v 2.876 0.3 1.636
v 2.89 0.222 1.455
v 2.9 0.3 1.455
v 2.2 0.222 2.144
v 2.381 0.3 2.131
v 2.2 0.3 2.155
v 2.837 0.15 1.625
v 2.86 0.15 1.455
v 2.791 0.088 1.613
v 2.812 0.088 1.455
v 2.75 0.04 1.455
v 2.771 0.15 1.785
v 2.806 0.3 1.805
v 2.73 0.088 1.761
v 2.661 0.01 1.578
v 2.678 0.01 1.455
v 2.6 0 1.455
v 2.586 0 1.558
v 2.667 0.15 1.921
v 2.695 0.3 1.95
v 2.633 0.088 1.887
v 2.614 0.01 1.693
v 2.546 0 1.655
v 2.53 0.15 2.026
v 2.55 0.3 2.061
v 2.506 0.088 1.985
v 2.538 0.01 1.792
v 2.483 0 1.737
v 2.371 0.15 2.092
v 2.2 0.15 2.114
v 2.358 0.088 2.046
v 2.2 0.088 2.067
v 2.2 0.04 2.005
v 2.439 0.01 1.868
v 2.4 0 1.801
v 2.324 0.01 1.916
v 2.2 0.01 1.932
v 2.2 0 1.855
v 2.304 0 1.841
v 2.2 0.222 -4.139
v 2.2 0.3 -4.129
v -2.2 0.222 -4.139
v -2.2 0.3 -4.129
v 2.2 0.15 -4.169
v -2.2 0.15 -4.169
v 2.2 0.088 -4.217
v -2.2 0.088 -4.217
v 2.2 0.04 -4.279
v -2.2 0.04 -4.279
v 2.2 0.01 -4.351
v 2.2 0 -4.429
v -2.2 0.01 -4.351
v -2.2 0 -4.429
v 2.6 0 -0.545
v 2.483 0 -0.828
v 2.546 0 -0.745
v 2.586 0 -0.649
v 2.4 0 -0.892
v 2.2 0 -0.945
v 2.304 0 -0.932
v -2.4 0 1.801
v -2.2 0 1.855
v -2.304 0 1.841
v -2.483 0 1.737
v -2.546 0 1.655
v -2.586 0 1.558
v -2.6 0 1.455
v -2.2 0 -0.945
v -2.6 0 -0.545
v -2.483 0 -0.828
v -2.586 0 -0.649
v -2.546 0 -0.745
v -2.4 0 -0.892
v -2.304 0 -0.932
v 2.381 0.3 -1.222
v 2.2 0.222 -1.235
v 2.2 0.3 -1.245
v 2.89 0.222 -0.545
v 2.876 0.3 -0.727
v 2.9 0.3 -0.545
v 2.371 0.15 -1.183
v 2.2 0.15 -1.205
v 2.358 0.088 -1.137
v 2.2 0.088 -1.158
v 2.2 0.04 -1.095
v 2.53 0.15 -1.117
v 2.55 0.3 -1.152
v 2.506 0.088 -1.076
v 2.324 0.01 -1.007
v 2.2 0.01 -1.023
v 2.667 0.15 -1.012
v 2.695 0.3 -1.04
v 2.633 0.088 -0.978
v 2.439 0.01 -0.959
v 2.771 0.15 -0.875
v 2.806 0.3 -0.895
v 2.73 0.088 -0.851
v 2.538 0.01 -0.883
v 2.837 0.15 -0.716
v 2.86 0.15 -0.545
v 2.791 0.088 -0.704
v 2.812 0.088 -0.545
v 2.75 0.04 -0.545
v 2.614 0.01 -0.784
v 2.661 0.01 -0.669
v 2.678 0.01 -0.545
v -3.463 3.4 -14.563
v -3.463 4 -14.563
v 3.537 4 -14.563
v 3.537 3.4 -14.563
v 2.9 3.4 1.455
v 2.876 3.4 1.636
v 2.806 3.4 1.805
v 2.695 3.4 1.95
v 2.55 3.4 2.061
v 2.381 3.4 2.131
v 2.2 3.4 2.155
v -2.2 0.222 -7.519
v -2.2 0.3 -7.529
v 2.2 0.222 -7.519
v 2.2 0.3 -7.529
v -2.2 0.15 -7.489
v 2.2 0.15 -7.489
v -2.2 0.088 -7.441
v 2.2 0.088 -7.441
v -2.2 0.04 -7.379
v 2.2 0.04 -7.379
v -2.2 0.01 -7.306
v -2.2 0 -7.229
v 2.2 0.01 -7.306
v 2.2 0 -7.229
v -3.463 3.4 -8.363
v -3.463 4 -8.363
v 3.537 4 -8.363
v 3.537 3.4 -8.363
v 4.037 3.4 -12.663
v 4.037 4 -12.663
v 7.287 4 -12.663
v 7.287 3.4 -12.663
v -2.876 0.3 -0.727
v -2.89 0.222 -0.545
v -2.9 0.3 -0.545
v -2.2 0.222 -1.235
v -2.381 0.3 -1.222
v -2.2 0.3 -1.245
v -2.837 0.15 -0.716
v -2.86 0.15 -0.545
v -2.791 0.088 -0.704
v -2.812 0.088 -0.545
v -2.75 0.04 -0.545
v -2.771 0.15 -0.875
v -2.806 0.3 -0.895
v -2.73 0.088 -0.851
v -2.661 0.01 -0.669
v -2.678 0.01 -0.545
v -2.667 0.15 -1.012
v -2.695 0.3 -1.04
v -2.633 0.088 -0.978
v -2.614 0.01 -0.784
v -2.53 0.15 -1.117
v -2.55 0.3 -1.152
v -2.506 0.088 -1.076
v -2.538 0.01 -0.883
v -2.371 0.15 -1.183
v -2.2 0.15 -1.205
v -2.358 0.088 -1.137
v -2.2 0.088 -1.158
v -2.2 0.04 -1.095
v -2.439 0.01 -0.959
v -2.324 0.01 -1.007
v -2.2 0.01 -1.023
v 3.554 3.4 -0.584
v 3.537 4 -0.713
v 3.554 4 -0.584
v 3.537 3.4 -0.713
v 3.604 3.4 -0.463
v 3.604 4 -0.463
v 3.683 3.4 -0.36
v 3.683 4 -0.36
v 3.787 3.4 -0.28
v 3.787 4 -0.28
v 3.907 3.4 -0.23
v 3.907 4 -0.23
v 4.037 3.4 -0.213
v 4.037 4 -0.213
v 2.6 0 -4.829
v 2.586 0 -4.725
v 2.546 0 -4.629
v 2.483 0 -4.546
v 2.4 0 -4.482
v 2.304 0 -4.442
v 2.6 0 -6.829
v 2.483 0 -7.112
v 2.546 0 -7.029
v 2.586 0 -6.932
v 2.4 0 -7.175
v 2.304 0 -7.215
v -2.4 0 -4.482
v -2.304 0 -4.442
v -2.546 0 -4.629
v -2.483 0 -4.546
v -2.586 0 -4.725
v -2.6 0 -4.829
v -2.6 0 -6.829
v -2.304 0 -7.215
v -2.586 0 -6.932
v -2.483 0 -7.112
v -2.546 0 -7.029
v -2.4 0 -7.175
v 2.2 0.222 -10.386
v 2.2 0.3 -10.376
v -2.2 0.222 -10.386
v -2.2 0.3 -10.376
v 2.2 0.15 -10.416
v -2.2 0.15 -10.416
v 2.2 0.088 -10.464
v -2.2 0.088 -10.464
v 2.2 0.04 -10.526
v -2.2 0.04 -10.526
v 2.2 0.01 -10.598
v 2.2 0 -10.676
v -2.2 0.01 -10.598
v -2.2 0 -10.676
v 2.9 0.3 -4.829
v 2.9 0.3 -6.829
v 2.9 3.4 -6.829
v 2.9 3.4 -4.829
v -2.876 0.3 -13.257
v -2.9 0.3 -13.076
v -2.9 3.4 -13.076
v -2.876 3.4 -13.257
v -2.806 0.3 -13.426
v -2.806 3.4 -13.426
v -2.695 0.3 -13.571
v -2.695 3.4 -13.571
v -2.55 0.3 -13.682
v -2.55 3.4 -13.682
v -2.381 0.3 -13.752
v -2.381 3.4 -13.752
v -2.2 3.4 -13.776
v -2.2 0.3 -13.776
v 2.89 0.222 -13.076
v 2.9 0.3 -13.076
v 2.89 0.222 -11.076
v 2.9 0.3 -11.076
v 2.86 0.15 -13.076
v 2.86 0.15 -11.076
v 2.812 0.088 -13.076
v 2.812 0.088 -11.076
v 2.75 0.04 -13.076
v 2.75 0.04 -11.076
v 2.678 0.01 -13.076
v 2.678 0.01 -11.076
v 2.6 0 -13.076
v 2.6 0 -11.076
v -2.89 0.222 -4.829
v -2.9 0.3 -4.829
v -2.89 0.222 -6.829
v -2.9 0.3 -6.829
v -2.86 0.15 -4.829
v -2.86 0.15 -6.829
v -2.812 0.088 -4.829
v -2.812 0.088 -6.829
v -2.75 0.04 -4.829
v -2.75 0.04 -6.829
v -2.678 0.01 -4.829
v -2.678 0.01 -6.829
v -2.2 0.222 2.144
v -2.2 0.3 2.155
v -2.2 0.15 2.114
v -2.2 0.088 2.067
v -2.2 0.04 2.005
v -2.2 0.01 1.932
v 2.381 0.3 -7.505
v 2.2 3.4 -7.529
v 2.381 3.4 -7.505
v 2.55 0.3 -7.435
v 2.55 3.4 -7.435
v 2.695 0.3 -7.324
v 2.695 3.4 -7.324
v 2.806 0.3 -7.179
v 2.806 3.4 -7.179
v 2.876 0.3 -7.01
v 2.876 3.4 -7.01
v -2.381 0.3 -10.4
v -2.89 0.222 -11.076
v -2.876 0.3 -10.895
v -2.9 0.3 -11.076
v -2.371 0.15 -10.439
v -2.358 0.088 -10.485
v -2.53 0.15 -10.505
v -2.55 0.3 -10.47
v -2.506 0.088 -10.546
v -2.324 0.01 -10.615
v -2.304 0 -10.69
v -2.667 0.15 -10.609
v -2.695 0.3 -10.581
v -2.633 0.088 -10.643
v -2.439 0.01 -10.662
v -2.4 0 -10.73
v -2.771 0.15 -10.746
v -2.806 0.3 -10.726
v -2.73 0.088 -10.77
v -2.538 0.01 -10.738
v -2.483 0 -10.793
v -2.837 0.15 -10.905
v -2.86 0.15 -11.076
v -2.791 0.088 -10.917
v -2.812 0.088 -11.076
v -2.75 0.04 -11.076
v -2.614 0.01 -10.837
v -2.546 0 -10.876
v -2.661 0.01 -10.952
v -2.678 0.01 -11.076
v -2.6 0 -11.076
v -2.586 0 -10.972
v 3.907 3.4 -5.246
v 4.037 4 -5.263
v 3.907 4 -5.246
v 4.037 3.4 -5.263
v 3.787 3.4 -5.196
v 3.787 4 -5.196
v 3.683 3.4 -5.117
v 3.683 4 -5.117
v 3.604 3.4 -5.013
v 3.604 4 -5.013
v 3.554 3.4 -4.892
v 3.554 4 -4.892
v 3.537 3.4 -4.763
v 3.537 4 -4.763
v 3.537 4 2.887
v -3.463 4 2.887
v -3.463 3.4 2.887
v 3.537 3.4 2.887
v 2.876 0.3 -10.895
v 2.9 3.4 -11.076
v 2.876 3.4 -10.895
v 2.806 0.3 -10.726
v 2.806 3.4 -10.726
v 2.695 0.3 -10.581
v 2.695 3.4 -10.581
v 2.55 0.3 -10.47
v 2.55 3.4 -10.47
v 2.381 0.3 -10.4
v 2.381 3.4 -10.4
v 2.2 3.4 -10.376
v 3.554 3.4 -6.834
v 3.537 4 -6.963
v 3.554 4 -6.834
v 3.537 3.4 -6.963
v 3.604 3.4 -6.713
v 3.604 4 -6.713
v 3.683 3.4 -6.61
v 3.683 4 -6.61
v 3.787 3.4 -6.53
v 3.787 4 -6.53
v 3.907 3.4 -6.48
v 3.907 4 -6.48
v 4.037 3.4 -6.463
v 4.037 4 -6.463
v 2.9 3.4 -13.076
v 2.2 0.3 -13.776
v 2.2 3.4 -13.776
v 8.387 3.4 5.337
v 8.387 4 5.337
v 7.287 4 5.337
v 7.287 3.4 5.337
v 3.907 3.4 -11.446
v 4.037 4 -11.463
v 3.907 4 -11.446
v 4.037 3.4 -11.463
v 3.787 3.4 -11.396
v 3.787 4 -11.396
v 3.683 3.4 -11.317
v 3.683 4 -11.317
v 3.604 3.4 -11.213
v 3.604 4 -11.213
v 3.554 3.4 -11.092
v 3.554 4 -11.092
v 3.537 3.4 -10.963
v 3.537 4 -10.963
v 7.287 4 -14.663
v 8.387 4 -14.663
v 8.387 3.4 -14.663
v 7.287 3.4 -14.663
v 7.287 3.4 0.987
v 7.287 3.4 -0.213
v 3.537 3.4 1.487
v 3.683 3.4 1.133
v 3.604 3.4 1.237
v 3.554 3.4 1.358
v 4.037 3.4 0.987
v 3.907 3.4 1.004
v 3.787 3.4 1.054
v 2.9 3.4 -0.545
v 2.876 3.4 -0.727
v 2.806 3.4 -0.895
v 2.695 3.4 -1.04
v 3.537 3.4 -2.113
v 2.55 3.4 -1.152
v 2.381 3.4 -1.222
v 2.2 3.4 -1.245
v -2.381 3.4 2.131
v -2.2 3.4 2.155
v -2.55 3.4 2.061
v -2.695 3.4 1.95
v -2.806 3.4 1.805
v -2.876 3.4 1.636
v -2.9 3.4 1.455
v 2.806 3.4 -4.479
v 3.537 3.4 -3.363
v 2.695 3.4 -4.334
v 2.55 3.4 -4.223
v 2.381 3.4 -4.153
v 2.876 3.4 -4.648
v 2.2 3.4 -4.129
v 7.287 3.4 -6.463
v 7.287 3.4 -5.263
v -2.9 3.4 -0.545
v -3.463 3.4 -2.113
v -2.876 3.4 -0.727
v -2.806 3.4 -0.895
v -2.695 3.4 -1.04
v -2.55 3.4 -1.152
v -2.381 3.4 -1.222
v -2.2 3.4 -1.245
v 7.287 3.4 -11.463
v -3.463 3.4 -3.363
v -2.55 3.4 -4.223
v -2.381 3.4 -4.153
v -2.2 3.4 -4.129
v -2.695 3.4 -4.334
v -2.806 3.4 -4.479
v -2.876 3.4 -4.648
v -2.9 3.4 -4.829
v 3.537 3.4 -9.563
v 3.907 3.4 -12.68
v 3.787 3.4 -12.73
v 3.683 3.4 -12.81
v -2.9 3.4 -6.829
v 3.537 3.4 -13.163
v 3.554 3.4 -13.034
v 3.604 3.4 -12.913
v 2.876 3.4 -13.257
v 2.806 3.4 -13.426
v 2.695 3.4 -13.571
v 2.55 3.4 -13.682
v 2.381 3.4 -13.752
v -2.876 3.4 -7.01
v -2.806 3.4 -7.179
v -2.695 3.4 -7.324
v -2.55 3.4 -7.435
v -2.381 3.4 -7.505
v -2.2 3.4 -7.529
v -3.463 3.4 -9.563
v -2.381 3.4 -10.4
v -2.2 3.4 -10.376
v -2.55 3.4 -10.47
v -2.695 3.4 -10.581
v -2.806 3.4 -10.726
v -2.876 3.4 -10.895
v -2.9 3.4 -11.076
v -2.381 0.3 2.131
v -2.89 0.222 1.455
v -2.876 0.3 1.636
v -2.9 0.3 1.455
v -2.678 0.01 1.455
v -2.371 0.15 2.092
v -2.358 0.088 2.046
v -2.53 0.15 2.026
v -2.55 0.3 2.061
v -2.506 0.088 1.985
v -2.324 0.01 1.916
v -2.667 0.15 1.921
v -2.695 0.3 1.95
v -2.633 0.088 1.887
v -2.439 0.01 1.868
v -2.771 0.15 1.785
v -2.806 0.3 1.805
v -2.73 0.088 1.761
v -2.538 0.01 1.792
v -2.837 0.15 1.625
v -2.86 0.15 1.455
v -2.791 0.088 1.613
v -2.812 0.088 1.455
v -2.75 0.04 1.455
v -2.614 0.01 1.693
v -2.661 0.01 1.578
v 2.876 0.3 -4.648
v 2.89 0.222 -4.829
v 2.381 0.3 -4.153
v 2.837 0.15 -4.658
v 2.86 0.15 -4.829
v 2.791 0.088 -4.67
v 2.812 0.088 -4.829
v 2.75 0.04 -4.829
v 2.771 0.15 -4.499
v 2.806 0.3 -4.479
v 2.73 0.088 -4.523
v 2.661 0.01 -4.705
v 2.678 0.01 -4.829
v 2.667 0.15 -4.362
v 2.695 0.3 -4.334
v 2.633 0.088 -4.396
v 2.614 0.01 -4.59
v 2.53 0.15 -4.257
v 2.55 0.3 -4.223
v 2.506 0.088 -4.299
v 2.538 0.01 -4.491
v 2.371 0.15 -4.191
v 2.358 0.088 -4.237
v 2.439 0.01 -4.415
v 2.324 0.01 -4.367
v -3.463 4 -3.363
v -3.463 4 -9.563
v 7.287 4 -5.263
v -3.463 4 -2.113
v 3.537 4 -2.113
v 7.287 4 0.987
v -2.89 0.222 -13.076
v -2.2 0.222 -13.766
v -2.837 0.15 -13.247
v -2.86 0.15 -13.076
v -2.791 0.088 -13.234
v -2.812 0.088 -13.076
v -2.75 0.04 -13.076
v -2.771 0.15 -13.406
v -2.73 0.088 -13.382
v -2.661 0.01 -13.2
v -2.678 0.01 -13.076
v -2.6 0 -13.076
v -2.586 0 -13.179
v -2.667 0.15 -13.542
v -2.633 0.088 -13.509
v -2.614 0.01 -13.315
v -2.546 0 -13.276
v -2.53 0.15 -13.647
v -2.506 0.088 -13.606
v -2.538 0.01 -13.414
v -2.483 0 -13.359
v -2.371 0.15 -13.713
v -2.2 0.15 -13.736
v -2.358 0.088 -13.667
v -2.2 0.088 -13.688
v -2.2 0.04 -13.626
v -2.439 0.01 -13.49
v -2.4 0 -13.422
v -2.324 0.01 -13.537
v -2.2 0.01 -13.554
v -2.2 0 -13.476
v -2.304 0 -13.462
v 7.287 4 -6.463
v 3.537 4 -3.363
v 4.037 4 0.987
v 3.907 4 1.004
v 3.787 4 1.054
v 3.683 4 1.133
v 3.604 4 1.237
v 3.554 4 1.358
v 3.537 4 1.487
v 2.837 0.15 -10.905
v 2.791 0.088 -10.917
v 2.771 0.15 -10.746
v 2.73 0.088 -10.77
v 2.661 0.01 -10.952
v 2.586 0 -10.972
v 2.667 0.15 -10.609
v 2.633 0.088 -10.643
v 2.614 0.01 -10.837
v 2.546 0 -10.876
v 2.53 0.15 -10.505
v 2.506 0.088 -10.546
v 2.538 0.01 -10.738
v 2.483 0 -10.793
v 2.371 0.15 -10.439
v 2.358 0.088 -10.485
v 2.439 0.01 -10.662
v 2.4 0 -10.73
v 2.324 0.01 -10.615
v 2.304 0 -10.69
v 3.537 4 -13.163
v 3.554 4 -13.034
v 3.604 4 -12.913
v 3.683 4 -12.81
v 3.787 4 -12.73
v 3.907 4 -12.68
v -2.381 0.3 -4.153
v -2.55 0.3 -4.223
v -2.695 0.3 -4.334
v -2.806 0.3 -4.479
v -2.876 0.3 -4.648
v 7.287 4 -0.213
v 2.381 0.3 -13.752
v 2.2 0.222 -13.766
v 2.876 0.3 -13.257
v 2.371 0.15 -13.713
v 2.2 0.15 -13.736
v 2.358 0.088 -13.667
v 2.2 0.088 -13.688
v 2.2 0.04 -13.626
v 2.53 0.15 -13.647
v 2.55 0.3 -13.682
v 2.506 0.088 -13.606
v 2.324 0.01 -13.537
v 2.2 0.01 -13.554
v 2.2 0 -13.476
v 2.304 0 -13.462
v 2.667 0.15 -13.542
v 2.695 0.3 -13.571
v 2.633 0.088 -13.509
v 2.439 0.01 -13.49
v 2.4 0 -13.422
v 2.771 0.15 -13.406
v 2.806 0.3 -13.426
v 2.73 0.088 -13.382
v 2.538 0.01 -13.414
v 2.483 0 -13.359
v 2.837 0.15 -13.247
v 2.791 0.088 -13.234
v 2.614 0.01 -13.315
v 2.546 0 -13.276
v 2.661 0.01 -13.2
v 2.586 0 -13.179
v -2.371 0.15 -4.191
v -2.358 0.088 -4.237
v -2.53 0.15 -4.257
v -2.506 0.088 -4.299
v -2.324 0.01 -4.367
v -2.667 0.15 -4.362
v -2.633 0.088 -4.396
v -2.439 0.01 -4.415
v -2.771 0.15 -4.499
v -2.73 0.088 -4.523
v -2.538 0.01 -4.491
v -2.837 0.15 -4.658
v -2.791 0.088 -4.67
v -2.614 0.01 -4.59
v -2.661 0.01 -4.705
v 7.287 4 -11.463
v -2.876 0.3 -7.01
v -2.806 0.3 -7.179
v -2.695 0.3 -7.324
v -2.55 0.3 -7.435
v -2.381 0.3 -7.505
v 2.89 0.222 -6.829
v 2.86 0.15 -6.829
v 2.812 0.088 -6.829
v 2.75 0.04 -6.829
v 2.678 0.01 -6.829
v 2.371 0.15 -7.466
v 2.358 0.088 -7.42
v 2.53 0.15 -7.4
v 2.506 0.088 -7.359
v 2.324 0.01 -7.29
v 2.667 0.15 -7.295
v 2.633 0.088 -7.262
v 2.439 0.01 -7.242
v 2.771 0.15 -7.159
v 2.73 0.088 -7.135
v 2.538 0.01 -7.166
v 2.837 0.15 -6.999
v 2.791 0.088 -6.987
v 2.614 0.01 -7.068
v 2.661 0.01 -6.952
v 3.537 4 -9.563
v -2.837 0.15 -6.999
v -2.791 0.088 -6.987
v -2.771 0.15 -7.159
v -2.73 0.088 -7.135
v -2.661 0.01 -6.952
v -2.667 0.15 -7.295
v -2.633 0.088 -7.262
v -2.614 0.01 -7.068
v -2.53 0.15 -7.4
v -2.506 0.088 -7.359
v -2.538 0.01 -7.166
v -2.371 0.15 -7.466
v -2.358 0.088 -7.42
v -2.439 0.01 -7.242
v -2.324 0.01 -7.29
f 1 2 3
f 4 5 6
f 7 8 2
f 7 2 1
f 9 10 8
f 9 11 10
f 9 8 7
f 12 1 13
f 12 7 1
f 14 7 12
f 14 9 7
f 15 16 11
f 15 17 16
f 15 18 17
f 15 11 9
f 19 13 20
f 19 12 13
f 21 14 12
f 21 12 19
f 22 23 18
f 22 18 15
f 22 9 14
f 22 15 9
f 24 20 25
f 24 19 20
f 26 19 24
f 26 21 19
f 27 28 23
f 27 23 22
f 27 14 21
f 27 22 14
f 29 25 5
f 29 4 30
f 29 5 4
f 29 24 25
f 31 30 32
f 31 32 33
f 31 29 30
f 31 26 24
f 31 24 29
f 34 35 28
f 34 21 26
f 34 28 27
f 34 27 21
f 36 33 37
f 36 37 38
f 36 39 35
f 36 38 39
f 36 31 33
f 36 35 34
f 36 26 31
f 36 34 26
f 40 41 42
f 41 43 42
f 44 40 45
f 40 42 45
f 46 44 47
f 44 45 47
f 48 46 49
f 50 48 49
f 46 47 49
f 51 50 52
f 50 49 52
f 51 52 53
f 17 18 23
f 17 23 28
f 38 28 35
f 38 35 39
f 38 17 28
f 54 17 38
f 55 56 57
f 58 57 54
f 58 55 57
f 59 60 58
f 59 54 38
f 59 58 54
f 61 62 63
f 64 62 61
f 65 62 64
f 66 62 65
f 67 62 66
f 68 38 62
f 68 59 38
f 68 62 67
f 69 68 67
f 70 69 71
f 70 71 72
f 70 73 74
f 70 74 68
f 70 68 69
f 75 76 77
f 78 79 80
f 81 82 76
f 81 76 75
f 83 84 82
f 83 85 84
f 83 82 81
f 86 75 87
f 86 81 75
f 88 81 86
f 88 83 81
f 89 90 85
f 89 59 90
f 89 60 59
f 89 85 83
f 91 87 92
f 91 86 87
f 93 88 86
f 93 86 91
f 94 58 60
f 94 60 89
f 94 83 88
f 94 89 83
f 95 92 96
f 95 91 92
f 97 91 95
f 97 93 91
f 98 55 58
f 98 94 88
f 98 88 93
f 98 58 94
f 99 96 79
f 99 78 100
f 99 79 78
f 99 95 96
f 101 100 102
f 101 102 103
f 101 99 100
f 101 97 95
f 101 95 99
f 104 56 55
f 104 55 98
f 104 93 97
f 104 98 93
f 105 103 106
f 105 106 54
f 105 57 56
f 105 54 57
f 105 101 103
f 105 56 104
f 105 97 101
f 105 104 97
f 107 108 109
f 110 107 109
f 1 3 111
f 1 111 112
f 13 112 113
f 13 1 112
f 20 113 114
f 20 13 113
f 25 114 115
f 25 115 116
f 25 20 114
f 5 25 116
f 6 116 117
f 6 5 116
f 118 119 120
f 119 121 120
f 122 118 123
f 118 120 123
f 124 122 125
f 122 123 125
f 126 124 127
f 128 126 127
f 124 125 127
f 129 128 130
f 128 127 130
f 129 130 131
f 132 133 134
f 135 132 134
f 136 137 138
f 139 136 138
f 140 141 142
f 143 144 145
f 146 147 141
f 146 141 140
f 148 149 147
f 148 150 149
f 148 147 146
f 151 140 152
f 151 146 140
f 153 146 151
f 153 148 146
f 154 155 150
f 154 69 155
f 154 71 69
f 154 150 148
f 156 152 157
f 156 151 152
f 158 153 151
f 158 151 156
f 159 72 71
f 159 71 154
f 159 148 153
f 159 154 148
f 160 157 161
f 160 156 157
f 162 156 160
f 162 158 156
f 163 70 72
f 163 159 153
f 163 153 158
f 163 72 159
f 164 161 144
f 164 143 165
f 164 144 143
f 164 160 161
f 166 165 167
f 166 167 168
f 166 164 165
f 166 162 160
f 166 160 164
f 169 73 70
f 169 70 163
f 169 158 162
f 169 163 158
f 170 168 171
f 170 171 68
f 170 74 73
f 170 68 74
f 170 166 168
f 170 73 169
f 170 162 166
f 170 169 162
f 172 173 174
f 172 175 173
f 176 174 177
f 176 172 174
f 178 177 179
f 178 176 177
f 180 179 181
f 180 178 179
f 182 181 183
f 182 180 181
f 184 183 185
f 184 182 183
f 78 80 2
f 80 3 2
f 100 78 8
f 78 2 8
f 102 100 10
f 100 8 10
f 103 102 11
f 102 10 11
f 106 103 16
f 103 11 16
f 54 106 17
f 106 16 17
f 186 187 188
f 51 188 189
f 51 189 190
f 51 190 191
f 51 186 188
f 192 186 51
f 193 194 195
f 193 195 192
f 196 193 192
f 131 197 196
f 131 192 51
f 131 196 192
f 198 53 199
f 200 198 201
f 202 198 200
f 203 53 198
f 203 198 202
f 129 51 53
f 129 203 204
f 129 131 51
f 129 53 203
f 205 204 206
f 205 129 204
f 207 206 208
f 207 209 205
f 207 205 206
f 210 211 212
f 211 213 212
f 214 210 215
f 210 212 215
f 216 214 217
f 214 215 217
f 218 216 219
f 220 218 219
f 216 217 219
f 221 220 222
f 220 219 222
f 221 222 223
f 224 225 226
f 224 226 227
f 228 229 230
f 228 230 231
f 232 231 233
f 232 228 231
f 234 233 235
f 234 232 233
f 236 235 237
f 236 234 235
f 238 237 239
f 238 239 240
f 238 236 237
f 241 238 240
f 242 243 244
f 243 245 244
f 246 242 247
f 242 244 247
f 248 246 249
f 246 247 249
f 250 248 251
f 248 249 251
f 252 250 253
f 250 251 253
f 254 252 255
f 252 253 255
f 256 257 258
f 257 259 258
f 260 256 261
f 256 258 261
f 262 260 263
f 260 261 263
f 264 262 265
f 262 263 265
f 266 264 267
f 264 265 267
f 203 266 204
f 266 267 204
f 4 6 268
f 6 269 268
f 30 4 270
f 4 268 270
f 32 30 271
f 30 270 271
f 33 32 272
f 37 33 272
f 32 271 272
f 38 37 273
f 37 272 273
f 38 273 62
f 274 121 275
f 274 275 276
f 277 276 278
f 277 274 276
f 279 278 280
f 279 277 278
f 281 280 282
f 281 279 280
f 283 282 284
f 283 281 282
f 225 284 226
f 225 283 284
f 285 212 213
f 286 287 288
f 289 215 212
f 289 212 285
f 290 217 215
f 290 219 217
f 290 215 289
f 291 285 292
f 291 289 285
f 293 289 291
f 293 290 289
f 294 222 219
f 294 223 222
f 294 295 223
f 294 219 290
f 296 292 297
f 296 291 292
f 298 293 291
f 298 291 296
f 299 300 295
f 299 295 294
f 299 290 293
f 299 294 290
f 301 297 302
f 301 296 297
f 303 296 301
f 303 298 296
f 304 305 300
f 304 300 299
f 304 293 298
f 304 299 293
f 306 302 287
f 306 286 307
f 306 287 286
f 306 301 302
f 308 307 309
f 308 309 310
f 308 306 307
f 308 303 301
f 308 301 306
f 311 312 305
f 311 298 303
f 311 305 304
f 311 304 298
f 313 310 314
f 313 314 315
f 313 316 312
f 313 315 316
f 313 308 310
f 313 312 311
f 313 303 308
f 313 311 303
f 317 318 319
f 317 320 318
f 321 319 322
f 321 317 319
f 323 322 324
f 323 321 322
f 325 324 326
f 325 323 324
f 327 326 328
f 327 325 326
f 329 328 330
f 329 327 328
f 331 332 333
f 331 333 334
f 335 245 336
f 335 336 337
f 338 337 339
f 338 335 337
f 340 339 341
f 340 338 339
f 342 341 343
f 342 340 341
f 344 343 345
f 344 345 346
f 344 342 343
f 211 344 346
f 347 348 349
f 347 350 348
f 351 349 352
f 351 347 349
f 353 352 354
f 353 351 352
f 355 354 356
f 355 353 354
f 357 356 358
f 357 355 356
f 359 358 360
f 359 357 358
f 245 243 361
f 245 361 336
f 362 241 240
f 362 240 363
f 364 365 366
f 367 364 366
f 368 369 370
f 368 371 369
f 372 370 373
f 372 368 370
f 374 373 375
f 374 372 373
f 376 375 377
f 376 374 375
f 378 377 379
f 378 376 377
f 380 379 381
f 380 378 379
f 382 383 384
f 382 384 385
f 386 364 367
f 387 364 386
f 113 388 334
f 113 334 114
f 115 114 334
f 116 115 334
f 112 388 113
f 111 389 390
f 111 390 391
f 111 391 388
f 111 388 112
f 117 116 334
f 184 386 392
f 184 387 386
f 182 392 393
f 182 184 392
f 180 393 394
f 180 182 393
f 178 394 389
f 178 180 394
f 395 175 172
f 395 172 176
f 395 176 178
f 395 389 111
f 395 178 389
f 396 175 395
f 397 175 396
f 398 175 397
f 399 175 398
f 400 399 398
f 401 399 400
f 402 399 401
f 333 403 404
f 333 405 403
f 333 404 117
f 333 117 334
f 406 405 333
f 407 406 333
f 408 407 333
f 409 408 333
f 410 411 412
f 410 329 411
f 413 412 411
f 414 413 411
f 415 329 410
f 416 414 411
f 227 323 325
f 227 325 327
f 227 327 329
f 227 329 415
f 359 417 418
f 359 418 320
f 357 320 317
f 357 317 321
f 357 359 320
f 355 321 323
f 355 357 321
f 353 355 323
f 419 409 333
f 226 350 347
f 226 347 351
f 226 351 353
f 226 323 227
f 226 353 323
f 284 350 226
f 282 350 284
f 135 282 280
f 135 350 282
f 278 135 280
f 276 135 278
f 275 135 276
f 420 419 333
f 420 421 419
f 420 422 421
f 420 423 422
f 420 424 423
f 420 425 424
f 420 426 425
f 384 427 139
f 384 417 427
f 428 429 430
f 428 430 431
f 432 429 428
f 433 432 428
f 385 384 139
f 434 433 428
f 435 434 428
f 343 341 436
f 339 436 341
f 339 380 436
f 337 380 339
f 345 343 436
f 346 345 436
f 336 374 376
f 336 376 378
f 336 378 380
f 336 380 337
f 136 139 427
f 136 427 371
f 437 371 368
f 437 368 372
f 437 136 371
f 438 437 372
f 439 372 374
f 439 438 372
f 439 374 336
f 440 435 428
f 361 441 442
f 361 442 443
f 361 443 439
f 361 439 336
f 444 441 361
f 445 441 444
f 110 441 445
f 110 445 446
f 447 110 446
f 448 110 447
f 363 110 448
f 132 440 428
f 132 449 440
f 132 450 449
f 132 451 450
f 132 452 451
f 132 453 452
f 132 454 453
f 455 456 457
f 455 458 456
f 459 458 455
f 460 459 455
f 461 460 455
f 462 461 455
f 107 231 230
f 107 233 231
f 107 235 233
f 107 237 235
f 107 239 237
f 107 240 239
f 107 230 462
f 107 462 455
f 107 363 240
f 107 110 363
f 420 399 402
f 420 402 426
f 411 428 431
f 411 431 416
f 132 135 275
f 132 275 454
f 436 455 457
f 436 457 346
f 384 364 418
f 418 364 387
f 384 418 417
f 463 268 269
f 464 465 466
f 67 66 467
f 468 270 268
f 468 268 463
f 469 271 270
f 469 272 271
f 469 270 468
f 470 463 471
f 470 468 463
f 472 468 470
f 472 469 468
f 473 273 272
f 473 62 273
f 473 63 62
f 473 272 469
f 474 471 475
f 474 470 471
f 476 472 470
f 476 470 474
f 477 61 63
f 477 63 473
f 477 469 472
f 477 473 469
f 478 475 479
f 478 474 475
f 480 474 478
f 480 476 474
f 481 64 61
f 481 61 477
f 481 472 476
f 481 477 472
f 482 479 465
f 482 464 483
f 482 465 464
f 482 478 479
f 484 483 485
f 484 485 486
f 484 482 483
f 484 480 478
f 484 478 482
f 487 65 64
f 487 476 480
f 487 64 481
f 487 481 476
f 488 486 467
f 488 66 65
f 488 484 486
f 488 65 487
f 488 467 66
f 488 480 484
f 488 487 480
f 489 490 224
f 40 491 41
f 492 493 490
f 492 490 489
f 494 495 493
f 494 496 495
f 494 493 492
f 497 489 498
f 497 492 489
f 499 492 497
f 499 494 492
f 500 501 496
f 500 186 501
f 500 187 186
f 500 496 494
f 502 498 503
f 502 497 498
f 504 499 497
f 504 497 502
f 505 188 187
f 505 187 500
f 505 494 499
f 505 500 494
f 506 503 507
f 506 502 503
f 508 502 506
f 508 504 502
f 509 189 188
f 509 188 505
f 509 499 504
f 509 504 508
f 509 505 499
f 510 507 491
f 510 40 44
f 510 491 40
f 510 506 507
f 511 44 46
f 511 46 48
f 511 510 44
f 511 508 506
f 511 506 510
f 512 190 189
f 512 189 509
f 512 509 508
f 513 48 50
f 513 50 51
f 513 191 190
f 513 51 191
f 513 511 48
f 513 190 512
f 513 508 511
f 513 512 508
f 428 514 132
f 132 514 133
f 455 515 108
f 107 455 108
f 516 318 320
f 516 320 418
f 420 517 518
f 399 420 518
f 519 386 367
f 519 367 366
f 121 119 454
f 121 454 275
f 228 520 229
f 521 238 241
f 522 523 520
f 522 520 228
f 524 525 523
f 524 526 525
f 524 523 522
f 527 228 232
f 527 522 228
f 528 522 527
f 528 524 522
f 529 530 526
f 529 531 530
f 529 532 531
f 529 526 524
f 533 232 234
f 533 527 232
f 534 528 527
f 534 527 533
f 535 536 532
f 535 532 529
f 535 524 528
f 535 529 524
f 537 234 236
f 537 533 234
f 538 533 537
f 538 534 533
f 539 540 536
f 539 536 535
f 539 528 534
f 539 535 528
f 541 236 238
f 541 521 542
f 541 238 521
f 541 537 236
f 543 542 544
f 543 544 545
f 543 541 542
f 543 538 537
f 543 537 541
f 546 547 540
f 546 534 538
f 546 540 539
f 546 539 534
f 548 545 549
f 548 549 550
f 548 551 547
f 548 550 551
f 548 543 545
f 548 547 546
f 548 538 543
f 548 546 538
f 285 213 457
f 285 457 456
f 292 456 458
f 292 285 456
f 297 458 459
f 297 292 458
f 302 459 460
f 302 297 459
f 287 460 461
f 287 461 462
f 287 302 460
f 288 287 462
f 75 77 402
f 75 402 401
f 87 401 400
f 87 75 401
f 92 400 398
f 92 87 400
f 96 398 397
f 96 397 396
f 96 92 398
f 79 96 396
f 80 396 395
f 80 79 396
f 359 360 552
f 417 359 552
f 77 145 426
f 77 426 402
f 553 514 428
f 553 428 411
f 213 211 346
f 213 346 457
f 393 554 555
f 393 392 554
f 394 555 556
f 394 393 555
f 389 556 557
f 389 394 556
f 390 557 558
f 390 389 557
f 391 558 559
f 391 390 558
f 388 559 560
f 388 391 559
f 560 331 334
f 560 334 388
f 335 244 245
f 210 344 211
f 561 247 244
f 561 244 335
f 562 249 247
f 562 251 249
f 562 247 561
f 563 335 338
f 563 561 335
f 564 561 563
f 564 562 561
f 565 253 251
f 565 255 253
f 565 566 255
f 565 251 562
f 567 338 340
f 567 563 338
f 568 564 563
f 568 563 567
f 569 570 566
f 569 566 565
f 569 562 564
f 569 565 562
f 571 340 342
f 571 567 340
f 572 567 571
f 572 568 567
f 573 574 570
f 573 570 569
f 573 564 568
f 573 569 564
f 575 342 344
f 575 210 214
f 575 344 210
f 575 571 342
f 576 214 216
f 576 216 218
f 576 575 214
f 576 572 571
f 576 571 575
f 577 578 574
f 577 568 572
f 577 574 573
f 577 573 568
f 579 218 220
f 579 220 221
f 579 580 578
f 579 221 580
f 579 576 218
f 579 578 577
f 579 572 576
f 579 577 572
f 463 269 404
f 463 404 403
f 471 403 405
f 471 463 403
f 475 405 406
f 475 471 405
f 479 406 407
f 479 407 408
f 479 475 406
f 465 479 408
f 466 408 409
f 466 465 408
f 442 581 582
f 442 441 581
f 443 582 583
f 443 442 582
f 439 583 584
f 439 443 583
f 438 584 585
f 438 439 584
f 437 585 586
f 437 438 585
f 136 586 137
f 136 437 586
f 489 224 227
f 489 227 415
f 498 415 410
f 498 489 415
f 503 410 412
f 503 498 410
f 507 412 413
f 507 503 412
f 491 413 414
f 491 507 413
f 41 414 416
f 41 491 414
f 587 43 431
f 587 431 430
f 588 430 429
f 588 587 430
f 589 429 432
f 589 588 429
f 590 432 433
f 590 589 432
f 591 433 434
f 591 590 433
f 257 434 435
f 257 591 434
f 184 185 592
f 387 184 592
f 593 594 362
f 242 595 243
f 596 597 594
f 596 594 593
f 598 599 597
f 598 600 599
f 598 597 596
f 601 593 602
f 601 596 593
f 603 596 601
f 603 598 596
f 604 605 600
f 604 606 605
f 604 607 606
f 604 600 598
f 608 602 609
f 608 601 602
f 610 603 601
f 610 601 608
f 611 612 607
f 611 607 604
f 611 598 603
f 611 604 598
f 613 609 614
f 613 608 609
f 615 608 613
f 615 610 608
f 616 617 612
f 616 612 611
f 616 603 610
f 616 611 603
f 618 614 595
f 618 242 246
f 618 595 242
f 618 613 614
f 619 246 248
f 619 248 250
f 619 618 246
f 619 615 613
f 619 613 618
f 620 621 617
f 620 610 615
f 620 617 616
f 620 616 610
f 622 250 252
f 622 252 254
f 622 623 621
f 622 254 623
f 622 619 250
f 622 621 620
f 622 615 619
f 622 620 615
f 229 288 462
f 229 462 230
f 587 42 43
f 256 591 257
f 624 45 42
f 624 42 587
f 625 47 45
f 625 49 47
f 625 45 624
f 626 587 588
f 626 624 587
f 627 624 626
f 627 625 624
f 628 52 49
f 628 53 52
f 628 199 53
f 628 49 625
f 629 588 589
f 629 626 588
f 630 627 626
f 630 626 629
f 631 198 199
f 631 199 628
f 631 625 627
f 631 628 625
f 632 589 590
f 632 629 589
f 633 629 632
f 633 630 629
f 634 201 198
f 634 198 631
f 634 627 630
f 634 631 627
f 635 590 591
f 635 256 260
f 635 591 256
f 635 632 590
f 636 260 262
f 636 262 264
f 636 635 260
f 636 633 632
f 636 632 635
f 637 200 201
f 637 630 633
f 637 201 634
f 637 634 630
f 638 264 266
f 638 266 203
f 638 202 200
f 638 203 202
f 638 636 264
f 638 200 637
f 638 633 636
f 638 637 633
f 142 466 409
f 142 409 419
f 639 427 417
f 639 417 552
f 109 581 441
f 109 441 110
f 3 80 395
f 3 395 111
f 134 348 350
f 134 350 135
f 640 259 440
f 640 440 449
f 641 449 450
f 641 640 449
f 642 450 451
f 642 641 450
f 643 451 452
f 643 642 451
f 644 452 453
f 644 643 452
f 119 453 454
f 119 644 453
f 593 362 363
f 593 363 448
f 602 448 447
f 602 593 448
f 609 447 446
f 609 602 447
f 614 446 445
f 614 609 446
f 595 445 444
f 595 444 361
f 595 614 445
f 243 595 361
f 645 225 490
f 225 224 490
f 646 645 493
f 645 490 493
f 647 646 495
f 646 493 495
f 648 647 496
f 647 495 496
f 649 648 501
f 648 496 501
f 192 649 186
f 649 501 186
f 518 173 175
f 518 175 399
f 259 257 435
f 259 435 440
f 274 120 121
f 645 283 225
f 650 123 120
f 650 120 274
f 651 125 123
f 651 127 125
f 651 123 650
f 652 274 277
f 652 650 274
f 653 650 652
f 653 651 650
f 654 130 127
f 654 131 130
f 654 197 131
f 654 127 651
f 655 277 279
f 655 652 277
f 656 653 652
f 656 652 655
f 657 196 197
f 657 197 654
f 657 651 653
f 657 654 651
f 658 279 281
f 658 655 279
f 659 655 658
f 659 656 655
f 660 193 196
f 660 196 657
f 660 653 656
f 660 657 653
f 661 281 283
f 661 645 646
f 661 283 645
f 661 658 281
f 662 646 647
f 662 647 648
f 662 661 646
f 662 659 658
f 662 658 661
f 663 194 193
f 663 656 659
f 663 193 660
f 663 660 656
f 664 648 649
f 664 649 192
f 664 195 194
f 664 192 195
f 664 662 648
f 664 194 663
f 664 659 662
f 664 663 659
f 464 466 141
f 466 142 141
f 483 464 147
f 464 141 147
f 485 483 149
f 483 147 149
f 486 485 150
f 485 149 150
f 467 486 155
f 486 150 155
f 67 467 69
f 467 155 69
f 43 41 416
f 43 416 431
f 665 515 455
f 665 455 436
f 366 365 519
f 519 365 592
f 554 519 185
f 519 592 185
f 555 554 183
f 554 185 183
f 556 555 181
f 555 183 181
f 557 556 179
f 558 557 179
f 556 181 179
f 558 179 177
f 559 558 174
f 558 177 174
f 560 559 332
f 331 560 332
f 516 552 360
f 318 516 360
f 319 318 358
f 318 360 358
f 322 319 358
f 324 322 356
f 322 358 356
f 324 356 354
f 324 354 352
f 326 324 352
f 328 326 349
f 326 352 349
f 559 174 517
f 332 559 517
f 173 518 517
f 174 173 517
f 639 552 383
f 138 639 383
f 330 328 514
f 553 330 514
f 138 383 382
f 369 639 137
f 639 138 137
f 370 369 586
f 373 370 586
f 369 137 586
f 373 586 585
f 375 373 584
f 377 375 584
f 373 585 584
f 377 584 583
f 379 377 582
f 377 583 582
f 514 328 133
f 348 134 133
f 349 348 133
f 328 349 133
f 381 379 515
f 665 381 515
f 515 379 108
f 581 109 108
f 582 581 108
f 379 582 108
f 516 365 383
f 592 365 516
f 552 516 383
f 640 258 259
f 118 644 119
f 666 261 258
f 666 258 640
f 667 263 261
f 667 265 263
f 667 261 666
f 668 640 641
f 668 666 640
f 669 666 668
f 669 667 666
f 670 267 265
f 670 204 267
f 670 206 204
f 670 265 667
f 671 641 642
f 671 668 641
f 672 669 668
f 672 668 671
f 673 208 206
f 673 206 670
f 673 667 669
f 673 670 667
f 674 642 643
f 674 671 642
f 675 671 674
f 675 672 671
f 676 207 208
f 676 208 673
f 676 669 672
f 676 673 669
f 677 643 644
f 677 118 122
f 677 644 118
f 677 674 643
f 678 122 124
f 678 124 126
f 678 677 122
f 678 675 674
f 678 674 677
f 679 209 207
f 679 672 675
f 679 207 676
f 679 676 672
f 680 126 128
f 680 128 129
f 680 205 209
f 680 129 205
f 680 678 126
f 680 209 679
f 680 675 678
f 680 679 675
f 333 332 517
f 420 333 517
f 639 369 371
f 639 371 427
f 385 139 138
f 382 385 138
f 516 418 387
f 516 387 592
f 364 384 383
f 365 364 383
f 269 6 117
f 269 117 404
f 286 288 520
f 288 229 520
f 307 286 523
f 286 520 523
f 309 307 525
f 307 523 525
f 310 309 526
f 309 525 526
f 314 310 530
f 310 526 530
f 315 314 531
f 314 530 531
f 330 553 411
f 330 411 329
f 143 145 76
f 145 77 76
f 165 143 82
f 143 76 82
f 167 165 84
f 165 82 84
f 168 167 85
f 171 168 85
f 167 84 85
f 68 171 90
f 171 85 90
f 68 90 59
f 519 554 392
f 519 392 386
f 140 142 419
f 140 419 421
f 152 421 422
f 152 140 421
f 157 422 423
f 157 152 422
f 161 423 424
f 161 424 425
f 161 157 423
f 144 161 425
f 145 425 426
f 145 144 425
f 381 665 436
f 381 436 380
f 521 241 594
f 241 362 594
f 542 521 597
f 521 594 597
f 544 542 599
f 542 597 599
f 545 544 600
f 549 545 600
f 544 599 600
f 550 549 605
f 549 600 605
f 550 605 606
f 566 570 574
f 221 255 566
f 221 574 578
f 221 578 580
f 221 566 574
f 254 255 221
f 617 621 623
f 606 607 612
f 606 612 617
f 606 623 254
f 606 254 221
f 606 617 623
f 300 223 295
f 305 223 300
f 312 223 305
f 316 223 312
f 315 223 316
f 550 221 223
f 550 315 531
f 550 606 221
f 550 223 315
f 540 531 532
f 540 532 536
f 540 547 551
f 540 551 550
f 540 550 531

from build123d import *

# Parameters (mm, degrees)
EXTRUDE_1_DEPTH      = 4
EXTRUDE_1_2_DEPTH    = 4
EXTRUDE_1_3_DEPTH    = 4
SKETCH_2_W           = 7
SKETCH_2_H           = 5
EXTRUDE_2_DEPTH      = 0.6
SKETCH_3_W           = 4.85
SKETCH_3_H           = 1.2
EXTRUDE_3_DEPTH      = 0.6
SKETCH_4_W           = 1
SKETCH_4_H           = 13.65
EXTRUDE_4_DEPTH      = 0.6
FILLET_1_R           = 0.5
FILLET_2_R           = 0.3
SKETCH_5_W           = 1.1
SKETCH_5_H           = 0.6
EXTRUDE_5_DEPTH      = 2
EXTRUDE_5_DEPTH_BACK = 18


with BuildPart() as part:
    # 草图1 → 凸台-拉伸1 (new body)
    with BuildSketch(Plane(origin=(0, 0, 0), x_dir=(1, 0, 0), z_dir=(0, 1, 0))):
        with BuildLine():
            Line((-2.2, 1.245389122), (2.2, 1.245389122))
            ThreePointArc((2.2, 1.245389122), (2.694974747, 1.040363869), (2.9, 0.545389122))
            Line((2.9, 0.545389122), (2.9, -1.454610878))
            ThreePointArc((2.9, -1.454610878), (2.694974747, -1.949585625), (2.2, -2.154610878))
            Line((2.2, -2.154610878), (-2.2, -2.154610878))
            ThreePointArc((-2.2, -2.154610878), (-2.694974747, -1.949585625), (-2.9, -1.454610878))
            Line((-2.9, -1.454610878), (-2.9, 0.545389122))
            ThreePointArc((-2.9, 0.545389122), (-2.694974747, 1.040363869), (-2.2, 1.245389122))
        make_face()
    extrude(amount=EXTRUDE_1_DEPTH)



with BuildPart() as body_2:
    # 草图1 → Extrude 1 2 (new body)
    with BuildSketch(Plane(origin=(0, 0, 0), x_dir=(1, 0, 0), z_dir=(0, 1, 0))):
        with BuildLine():
            Line((-2.2, 7.528722779), (2.2, 7.528722779))
            ThreePointArc((2.2, 7.528722779), (2.694974747, 7.323697526), (2.9, 6.828722779))
            Line((2.9, 6.828722779), (2.9, 4.828722779))
            ThreePointArc((2.9, 4.828722779), (2.694974747, 4.333748032), (2.2, 4.128722779))
            Line((2.2, 4.128722779), (-2.2, 4.128722779))
            ThreePointArc((-2.2, 4.128722779), (-2.694974747, 4.333748032), (-2.9, 4.828722779))
            Line((-2.9, 4.828722779), (-2.9, 6.828722779))
            ThreePointArc((-2.9, 6.828722779), (-2.694974747, 7.323697526), (-2.2, 7.528722779))
        make_face()
    extrude(amount=EXTRUDE_1_2_DEPTH)


with BuildPart() as body_3:
    # 草图1 → Extrude 1 3 (new body)
    with BuildSketch(Plane(origin=(0, 0, 0), x_dir=(1, 0, 0), z_dir=(0, 1, 0))):
        with BuildLine():
            Line((-2.2, 13.775919566), (2.2, 13.775919566))
            ThreePointArc((2.2, 13.775919566), (2.694974747, 13.570894313), (2.9, 13.075919566))
            Line((2.9, 13.075919566), (2.9, 11.075919566))
            ThreePointArc((2.9, 11.075919566), (2.694974747, 10.580944819), (2.2, 10.375919566))
            Line((2.2, 10.375919566), (-2.2, 10.375919566))
            ThreePointArc((-2.2, 10.375919566), (-2.694974747, 10.580944819), (-2.9, 11.075919566))
            Line((-2.9, 11.075919566), (-2.9, 13.075919566))
            ThreePointArc((-2.9, 13.075919566), (-2.694974747, 13.570894313), (-2.2, 13.775919566))
        make_face()
    extrude(amount=EXTRUDE_1_3_DEPTH)


with BuildPart() as part_1:
    add(part.part)

    add(body_2.part)  # 凸台-拉伸2 merges body 2

    add(body_3.part)  # 凸台-拉伸2 merges body 3
    # 草图2 → 凸台-拉伸2 (add)
    with BuildSketch(Plane(origin=(0, 4, 0), x_dir=(1, 0, 0), z_dir=(0, 1, 0))):
        with Locations((0.036699987, 12.063062551)):
            Rectangle(SKETCH_2_W, SKETCH_2_H)
        with Locations((0.036699987, 5.863062551)):
            Rectangle(SKETCH_2_W, SKETCH_2_H)
        with Locations((0.036699987, -0.386937449)):
            Rectangle(SKETCH_2_W, SKETCH_2_H)
    extrude(amount=-EXTRUDE_2_DEPTH)

    # 草图3 → 凸台-拉伸3 (add)
    with BuildSketch(Plane(origin=(0, 4, 0), x_dir=(1, 0, 0), z_dir=(0, 1, 0))):
        with Locations((5.961699987, 12.063062551)):
            Rectangle(SKETCH_3_W, SKETCH_3_H)
        with Locations((5.961699987, 5.863062551)):
            Rectangle(SKETCH_3_W, SKETCH_3_H)
        with Locations((5.961699987, -0.386937449)):
            Rectangle(SKETCH_3_W, SKETCH_3_H)
    extrude(amount=-EXTRUDE_3_DEPTH)

    # 草图4 → 凸台-拉伸4 (add)
    with BuildSketch(Plane.XZ.offset(-3.4)):
        with Locations((7.886699987, -5.838062551)):
            Rectangle(SKETCH_4_W, SKETCH_4_H)
    extrude(amount=-EXTRUDE_4_DEPTH)

    # 圆角1
    fillet_1_edges = [part_1.edges().sort_by_distance(p)[0] for p in [
        (3.536699987, 3.7, -11.463062551),
        (3.536699987, 3.7, -12.663062551),
        (3.536699987, 3.7, 0.986937449),
        (3.536699987, 3.7, -0.213062551),
        (3.536699987, 3.7, -5.263062551),
        (3.536699987, 3.7, -6.463062551),
    ]]
    fillet(fillet_1_edges, radius=FILLET_1_R)

    # 圆角2
    fillet_2_edges = [part_1.edges().sort_by_distance(p)[0] for p in [
        (-2.9, 0, 0.454610878),
        (-2.694974747, 0, -1.040363869),
        (-2.694974747, 0, -13.570894313),
        (-2.9, 0, -12.075919566),
        (-2.694974747, 0, -10.580944819),
        (0, 0, -10.375919566),
        (2.694974747, 0, -10.580944819),
        (2.9, 0, -12.075919566),
        (2.694974747, 0, -13.570894313),
        (0, 0, -13.775919566),
        (0, 0, -1.245389122),
        (2.694974747, 0, -1.040363869),
        (2.9, 0, 0.454610878),
        (2.694974747, 0, 1.949585625),
        (-2.694974747, 0, -7.323697526),
        (-2.9, 0, -5.828722779),
        (-2.694974747, 0, -4.333748032),
        (0, 0, -4.128722779),
        (2.694974747, 0, -4.333748032),
        (2.9, 0, -5.828722779),
        (0, 0, 2.154610878),
        (2.694974747, 0, -7.323697526),
        (0, 0, -7.528722779),
        (-2.694974747, 0, 1.949585625),
    ]]
    fillet(fillet_2_edges, radius=FILLET_2_R)

    # 草图5 → 凸台-拉伸5 (add, two sides)
    with BuildSketch(Plane(origin=(0, 0, -12.663062551), x_dir=(-1, 0, 0), z_dir=(0, 0, -1))) as extrude_5_sk:
        with Locations((-7.836699987, 3.7)):
            Rectangle(SKETCH_5_W, SKETCH_5_H)
    extrude(amount=EXTRUDE_5_DEPTH)
    extrude(extrude_5_sk.sketch, amount=-EXTRUDE_5_DEPTH_BACK)


solid = part_1.part
